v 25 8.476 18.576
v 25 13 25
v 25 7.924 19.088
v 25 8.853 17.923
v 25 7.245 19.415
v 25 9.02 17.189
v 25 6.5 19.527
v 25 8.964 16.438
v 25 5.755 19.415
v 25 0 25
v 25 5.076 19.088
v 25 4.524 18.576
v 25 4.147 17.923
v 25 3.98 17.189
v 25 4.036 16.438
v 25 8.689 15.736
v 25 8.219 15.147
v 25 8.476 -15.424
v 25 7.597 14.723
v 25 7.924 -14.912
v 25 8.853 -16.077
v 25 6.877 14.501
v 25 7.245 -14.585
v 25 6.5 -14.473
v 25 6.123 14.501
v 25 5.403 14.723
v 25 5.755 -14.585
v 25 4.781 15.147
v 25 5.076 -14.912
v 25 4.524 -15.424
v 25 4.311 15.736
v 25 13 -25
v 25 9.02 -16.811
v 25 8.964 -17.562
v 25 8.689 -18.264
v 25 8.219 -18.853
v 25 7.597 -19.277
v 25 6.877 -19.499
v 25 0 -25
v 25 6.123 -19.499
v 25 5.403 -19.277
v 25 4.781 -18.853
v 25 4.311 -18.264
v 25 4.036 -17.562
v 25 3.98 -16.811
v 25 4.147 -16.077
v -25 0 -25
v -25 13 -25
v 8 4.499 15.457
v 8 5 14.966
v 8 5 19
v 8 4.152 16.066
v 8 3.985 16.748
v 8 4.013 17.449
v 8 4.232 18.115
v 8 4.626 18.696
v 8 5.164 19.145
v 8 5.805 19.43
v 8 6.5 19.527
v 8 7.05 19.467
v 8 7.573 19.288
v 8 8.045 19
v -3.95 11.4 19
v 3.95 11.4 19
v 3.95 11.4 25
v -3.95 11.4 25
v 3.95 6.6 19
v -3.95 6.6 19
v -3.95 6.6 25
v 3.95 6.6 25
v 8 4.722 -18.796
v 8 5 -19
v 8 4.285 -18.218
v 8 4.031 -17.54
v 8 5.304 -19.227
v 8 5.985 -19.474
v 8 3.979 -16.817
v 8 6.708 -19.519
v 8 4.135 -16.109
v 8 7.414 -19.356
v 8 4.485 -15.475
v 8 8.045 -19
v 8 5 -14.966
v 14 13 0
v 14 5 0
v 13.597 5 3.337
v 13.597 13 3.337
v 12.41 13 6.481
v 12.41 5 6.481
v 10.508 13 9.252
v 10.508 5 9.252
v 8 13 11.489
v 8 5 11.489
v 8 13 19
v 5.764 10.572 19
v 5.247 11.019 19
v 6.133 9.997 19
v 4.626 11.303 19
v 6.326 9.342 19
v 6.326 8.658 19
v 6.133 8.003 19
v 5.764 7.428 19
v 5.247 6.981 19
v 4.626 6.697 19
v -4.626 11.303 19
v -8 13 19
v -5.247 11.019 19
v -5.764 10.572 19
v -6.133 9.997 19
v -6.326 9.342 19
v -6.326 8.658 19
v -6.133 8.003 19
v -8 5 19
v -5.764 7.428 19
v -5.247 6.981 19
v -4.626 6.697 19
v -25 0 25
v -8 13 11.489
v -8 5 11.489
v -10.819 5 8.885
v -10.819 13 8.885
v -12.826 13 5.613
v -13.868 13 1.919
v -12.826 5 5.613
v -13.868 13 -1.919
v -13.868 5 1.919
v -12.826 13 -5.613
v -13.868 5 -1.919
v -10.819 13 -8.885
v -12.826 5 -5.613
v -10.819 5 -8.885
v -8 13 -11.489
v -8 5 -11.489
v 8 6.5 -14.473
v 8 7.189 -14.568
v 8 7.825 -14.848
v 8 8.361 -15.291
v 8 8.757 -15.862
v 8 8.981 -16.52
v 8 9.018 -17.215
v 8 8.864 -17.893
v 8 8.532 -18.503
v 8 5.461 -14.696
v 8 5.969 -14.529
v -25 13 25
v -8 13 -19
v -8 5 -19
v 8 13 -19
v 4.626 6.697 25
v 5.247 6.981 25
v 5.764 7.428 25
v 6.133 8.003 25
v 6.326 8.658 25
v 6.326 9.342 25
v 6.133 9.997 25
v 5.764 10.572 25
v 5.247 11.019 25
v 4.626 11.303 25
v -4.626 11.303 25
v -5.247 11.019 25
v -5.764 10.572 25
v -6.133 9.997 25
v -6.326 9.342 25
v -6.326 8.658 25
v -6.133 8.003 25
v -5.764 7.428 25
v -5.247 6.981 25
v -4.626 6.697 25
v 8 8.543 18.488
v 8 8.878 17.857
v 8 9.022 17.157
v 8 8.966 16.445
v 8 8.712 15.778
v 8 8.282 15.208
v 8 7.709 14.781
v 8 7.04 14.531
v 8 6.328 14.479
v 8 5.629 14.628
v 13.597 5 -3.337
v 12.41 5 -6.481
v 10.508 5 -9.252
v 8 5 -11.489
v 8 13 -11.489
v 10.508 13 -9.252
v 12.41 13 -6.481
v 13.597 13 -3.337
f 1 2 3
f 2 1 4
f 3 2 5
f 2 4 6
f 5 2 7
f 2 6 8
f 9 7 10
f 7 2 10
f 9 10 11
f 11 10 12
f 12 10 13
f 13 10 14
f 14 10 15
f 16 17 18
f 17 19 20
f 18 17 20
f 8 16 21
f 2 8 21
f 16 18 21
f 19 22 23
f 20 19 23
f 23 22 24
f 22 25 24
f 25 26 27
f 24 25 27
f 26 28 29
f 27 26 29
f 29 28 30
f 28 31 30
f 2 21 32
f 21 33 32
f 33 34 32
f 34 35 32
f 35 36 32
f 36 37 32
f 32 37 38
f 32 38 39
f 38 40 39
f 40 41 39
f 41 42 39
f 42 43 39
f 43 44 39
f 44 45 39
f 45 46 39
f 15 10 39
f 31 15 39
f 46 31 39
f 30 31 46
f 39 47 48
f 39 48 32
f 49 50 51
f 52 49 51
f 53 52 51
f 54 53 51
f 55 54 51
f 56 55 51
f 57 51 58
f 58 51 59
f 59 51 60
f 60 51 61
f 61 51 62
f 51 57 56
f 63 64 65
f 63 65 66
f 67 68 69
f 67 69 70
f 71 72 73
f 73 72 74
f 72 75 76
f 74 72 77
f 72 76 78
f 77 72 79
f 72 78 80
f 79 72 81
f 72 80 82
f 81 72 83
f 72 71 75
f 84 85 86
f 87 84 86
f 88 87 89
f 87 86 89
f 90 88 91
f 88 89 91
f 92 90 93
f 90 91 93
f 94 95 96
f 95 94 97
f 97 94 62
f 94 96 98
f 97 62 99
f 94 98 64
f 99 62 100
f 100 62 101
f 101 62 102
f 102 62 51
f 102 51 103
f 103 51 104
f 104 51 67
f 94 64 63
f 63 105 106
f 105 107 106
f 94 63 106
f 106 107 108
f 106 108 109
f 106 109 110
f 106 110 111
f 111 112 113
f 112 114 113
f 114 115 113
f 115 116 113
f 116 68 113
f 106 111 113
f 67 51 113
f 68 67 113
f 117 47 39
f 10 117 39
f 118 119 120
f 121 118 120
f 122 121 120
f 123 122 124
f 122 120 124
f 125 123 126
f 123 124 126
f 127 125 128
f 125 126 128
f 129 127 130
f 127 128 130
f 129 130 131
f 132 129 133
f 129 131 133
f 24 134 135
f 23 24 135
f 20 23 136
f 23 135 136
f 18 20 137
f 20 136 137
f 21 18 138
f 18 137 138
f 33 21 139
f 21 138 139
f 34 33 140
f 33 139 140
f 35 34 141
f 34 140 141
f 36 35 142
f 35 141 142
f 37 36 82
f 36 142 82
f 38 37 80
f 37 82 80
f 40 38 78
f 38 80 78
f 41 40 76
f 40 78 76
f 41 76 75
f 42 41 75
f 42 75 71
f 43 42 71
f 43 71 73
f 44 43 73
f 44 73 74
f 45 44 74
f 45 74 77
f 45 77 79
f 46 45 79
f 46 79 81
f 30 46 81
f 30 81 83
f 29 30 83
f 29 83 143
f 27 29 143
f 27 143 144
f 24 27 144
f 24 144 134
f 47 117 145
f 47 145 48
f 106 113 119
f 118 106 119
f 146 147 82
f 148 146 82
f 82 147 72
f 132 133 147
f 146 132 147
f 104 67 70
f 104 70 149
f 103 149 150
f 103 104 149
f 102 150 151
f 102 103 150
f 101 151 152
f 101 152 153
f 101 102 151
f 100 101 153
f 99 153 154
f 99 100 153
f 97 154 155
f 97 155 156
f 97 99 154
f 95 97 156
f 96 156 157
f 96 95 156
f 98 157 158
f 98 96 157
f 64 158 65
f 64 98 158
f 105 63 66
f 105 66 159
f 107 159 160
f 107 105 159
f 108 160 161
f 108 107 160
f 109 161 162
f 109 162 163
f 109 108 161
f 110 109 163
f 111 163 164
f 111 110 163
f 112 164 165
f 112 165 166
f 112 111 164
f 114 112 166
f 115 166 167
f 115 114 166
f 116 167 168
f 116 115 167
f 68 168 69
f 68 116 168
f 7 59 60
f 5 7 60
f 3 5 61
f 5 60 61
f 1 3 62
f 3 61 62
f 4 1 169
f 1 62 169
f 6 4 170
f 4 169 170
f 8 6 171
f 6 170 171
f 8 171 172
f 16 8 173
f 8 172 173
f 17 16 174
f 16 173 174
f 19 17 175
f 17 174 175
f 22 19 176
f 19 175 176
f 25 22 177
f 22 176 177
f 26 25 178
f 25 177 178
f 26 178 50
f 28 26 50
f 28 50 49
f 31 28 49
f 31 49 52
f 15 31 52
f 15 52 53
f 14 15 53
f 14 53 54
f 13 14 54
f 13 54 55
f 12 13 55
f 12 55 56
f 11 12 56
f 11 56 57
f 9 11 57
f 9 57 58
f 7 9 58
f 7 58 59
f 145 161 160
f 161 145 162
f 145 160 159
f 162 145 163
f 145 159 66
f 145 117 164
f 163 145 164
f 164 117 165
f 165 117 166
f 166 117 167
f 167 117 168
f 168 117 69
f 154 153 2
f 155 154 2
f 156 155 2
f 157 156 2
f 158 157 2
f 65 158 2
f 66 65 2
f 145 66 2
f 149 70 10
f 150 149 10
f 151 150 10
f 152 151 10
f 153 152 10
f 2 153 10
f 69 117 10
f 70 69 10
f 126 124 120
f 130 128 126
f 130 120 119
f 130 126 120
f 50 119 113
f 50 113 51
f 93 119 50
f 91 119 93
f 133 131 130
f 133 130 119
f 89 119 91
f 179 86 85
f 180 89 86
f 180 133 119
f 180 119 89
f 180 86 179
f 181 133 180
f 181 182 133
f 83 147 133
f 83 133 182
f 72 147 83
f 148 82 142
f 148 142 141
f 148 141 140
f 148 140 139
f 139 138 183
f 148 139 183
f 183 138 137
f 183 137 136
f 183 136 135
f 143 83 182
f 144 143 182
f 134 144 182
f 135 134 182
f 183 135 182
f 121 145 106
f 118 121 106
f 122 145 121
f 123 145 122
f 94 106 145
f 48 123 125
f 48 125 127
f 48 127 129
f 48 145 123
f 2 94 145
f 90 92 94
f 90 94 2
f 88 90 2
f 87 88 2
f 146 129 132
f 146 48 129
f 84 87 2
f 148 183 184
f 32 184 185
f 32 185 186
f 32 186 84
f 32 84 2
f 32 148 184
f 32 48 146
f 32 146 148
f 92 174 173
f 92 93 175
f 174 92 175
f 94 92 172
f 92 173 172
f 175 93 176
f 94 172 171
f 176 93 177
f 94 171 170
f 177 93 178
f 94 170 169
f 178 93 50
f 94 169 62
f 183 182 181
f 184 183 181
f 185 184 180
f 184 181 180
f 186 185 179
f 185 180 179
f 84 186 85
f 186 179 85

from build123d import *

# Parameters (mm, degrees)
SKETCH1_W                       = 50
SKETCH1_H                       = 50
BOSS_EXTRUDE1_DEPTH             = 13
BOSS_EXTRUDE2_DEPTH             = 5
F_8_0_199_DIAMETER_HOLE1_D      = 5.0546
F_8_0_199_DIAMETER_HOLE1_DEPTH  = 17
F_12_START                      = 19
F_12_0_189_DIAMETER_SLOT1_DEPTH = 6


# Read off the part's stored shape, not the designer's step: #12 (0.189) Diameter Slot1
with BuildPart() as part:
    # Sketch1 → Boss-Extrude1 (new body)
    with BuildSketch(Plane(origin=(0, 0, 0), x_dir=(1, 0, 0), z_dir=(0, 1, 0))):
        Rectangle(SKETCH1_W, SKETCH1_H)
        with BuildLine():
            Line((-8, 19), (8, 19))
            Line((8, 19), (8, 11.489125293))
            ThreePointArc((8, 11.489125293), (12.409673646, 6.480740698), (14, 0))
            ThreePointArc((14, 0), (12.409673646, -6.480740698), (8, -11.489125293))
            Line((8, -11.489125293), (8, -19))
            Line((8, -19), (-8, -19))
            Line((-8, -19), (-8, -11.489125293))
            ThreePointArc((-8, -11.489125293), (-14, 0), (-8, 11.489125293))
            Line((-8, 11.489125293), (-8, 19))
        make_face(mode=Mode.SUBTRACT)
    extrude(amount=BOSS_EXTRUDE1_DEPTH)

    # Sketch1<3> → Boss-Extrude2 (add)
    with BuildSketch(Plane(origin=(0, 0, 0), x_dir=(1, 0, 0), z_dir=(0, 1, 0))):
        with BuildLine():
            Line((8, -19), (8, -11.489125293))
            ThreePointArc((8, -11.489125293), (0, -14), (-8, -11.489125293))
            Line((-8, -11.489125293), (-8, -19))
            Line((-8, -19), (8, -19))
        make_face()
        with BuildLine():
            Line((8, -11.489125293), (8, 11.489125293))
            ThreePointArc((8, 11.489125293), (0, 14), (-8, 11.489125293))
            Line((-8, 11.489125293), (-8, -11.489125293))
            ThreePointArc((-8, -11.489125293), (0, -14), (8, -11.489125293))
        make_face()
        with BuildLine():
            Line((-8, -11.489125293), (-8, 11.489125293))
            ThreePointArc((-8, 11.489125293), (-14, 0), (-8, -11.489125293))
        make_face()
        with BuildLine():
            Line((8, 11.489125293), (8, 19))
            Line((8, 19), (-8, 19))
            Line((-8, 19), (-8, 11.489125293))
            ThreePointArc((-8, 11.489125293), (0, 14), (8, 11.489125293))
        make_face()
        with BuildLine():
            ThreePointArc((14, 0), (12.409673646, 6.480740698), (8, 11.489125293))
            Line((8, 11.489125293), (8, -11.489125293))
            ThreePointArc((8, -11.489125293), (12.409673646, -6.480740698), (14, 0))
        make_face()
    extrude(amount=BOSS_EXTRUDE2_DEPTH)

    # #8 (0.199) Diameter Hole1
    with Locations(Plane(origin=(25, 0, 0), x_dir=(0, 0, -1), z_dir=(1, 0, 0))):
        with Locations((-17, 6.5), (17, 6.5)):
            Hole(F_8_0_199_DIAMETER_HOLE1_D / 2, depth=F_8_0_199_DIAMETER_HOLE1_DEPTH)

    # #12 (0.189) Diameter Slot1 outline → #12 (0.189) Diameter Slot1 (cut)
    with BuildSketch(Plane.XY.offset(F_12_START)):
        with BuildLine():
            Line((-3.9497, 6.5997), (3.9497, 6.5997))
            ThreePointArc((3.9497, 6.5997), (6.35, 9), (3.9497, 11.4003))
            Line((3.9497, 11.4003), (-3.9497, 11.4003))
            ThreePointArc((-3.9497, 11.4003), (-6.35, 9), (-3.9497, 6.5997))
        make_face()
    extrude(amount=F_12_0_189_DIAMETER_SLOT1_DEPTH, mode=Mode.SUBTRACT)


solid = part.part
